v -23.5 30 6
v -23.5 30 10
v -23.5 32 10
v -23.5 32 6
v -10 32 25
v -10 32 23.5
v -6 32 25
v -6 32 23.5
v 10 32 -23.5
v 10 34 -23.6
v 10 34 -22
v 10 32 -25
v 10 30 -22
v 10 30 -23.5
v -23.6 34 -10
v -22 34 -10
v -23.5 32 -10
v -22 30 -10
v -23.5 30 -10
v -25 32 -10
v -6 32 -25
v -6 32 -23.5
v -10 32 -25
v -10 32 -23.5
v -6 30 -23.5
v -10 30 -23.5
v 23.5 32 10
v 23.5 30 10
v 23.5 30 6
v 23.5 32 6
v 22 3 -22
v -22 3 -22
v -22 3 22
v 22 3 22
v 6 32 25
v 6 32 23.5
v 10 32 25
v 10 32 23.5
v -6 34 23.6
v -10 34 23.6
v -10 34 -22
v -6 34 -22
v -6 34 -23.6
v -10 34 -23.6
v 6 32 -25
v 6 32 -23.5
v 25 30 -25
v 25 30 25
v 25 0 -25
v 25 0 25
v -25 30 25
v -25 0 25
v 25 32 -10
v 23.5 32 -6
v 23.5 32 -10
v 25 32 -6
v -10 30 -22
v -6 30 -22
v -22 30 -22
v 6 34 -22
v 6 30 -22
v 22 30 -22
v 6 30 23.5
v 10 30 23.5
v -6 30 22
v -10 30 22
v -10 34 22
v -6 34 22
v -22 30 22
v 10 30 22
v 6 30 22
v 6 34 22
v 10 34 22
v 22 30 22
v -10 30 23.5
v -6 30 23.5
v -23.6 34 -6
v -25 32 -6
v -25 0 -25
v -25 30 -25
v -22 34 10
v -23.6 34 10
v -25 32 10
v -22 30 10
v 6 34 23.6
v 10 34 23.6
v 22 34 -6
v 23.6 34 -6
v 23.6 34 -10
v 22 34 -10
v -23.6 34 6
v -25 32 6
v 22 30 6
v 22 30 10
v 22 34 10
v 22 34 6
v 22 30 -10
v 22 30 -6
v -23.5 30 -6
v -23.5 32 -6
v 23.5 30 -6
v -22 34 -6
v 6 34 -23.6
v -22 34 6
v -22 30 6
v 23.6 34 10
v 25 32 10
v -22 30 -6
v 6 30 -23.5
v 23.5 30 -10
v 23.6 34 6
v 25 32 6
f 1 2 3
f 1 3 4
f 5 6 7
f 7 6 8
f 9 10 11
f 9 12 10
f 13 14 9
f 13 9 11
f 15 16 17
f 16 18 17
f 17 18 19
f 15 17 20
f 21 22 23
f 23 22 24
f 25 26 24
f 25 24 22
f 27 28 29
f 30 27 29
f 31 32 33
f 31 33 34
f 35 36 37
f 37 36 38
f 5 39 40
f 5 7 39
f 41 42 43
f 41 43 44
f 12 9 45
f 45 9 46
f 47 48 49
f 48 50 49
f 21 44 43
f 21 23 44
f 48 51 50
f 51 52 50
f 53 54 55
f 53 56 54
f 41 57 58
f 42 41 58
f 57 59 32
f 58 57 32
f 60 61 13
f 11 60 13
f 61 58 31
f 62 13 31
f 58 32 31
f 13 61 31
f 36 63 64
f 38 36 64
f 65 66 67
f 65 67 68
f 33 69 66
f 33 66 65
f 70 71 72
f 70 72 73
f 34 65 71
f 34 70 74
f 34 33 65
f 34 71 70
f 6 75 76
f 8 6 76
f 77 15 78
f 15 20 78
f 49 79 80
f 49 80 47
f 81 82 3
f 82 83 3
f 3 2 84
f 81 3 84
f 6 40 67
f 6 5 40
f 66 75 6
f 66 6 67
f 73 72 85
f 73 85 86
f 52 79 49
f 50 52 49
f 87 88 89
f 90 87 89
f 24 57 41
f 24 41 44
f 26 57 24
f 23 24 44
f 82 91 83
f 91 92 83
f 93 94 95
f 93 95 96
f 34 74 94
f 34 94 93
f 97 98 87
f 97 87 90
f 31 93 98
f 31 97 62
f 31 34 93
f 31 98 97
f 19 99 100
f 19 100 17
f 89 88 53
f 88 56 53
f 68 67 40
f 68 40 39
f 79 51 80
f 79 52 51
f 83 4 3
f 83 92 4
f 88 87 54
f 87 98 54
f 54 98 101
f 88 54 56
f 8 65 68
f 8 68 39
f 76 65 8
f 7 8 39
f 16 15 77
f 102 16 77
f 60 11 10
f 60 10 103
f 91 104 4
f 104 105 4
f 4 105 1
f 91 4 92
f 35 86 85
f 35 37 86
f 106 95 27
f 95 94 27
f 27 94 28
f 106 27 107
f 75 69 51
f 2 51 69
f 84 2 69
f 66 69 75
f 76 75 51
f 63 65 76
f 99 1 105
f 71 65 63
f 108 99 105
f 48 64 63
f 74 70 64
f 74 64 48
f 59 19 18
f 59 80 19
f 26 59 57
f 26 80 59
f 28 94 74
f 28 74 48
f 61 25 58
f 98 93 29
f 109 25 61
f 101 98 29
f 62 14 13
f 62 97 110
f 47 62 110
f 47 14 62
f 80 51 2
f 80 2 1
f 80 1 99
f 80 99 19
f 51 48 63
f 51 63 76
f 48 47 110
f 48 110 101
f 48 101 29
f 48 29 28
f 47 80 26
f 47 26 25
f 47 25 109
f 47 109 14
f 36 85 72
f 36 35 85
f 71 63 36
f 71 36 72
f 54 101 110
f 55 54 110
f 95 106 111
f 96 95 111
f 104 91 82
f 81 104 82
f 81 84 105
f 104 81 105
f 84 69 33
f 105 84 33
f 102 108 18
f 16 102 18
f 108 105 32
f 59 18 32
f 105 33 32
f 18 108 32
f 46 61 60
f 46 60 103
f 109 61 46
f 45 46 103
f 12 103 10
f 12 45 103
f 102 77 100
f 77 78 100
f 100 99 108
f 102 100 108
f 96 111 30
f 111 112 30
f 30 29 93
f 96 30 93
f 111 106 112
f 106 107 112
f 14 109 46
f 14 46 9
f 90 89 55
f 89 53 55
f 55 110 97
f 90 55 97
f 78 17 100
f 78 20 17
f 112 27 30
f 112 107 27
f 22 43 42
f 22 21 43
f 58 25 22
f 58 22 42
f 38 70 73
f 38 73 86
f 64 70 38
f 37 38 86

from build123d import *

# Parameters (mm, degrees)
SKETCH_1_W      = 50
SKETCH_1_H      = 50
EXTRUDE_1_DEPTH = 3
SKETCH_2_W      = 50
SKETCH_2_H      = 50
SKETCH_2_W_2    = 44
SKETCH_2_H_2    = 44
EXTRUDE_2_DEPTH = 27
SKETCH_3_W      = 4
SKETCH_3_H      = 1.5
SKETCH_3_W_2    = 1.5
SKETCH_3_H_2    = 4
EXTRUDE_3_DEPTH = 4


with BuildPart() as part:
    # 草图1 → 凸台-拉伸1 (new body)
    with BuildSketch(Plane(origin=(0, 0, 0), x_dir=(1, 0, 0), z_dir=(0, 1, 0))):
        Rectangle(SKETCH_1_W, SKETCH_1_H)
    extrude(amount=EXTRUDE_1_DEPTH)

    # 草图2 → 凸台-拉伸2 (add)
    with BuildSketch(Plane(origin=(0, 3, 0), x_dir=(1, 0, 0), z_dir=(0, 1, 0))):
        Rectangle(SKETCH_2_W, SKETCH_2_H)
        Rectangle(SKETCH_2_W_2, SKETCH_2_H_2, mode=Mode.SUBTRACT)
    extrude(amount=EXTRUDE_2_DEPTH)

    # 草图3 → 凸台-拉伸3 (add)
    with BuildSketch(Plane(origin=(0, 30, 0), x_dir=(1, 0, 0), z_dir=(0, 1, 0))):
        with Locations((-8, -22.75)):
            Rectangle(SKETCH_3_W, SKETCH_3_H)
        with Locations((8, -22.75)):
            Rectangle(SKETCH_3_W, SKETCH_3_H)
        with Locations((-22.75, 8)):
            Rectangle(SKETCH_3_W_2, SKETCH_3_H_2)
        with Locations((-22.75, -8)):
            Rectangle(SKETCH_3_W_2, SKETCH_3_H_2)
        with Locations((8, 22.75)):
            Rectangle(SKETCH_3_W, SKETCH_3_H)
        with Locations((-8, 22.75)):
            Rectangle(SKETCH_3_W, SKETCH_3_H)
        with Locations((22.75, -8)):
            Rectangle(SKETCH_3_W_2, SKETCH_3_H_2)
        with Locations((22.75, 8)):
            Rectangle(SKETCH_3_W_2, SKETCH_3_H_2)
    extrude(amount=EXTRUDE_3_DEPTH)

    # 草图4 → 放样2 section 0
    with BuildSketch(Plane(origin=(0, 34, 0), x_dir=(1, 0, 0), z_dir=(0, 1, 0))):
        with BuildLine():
            Line((-23.5, 10), (-23.6, 10))
            Line((-23.6, 10), (-23.6, 6))
            Line((-23.6, 6), (-23.5, 6))
            Line((-23.5, 6), (-23.5, 10))
        make_face()
    # 草图6 → 放样2 section 1
    with BuildSketch(Plane(origin=(0, 32, 0), x_dir=(1, 0, 0), z_dir=(0, 1, 0))):
        with BuildLine():
            Line((-23.5, 10), (-25, 10))
            Line((-25, 10), (-25, 6))
            Line((-25, 6), (-23.5, 6))
            Line((-23.5, 6), (-23.5, 10))
        make_face()
    loft()

    # 草图8 → 放样3 section 0
    with BuildSketch(Plane(origin=(0, 34, 0), x_dir=(1, 0, 0), z_dir=(0, 1, 0))):
        with BuildLine():
            Line((-23.5, -6), (-23.6, -6))
            Line((-23.6, -6), (-23.6, -10))
            Line((-23.6, -10), (-23.5, -10))
            Line((-23.5, -10), (-23.5, -6))
        make_face()
    # 草图9 → 放样3 section 1
    with BuildSketch(Plane(origin=(0, 32, 0), x_dir=(1, 0, 0), z_dir=(0, 1, 0))):
        with BuildLine():
            Line((-23.5, -6), (-25, -6))
            Line((-25, -6), (-25, -10))
            Line((-25, -10), (-23.5, -10))
            Line((-23.5, -10), (-23.5, -6))
        make_face()
    loft()

    # 草图10 → 放样4 section 0
    with BuildSketch(Plane(origin=(0, 34, 0), x_dir=(1, 0, 0), z_dir=(0, 1, 0))):
        with BuildLine():
            Line((-10, -23.5), (-6, -23.5))
            Line((-6, -23.5), (-6, -23.6))
            Line((-6, -23.6), (-10, -23.6))
            Line((-10, -23.6), (-10, -23.5))
        make_face()
    # 草图11 → 放样4 section 1
    with BuildSketch(Plane(origin=(0, 32, 0), x_dir=(1, 0, 0), z_dir=(0, 1, 0))):
        with BuildLine():
            Line((-10, -23.5), (-6, -23.5))
            Line((-6, -23.5), (-6, -25))
            Line((-6, -25), (-10, -25))
            Line((-10, -25), (-10, -23.5))
        make_face()
    loft()

    # 草图12 → 放样5 section 0
    with BuildSketch(Plane(origin=(0, 34, 0), x_dir=(1, 0, 0), z_dir=(0, 1, 0))):
        with BuildLine():
            Line((6, -23.5), (10, -23.5))
            Line((10, -23.5), (10, -23.6))
            Line((10, -23.6), (6, -23.6))
            Line((6, -23.6), (6, -23.5))
        make_face()
    # 草图13 → 放样5 section 1
    with BuildSketch(Plane(origin=(0, 32, 0), x_dir=(1, 0, 0), z_dir=(0, 1, 0))):
        with BuildLine():
            Line((6, -23.5), (10, -23.5))
            Line((10, -23.5), (10, -25))
            Line((10, -25), (6, -25))
            Line((6, -25), (6, -23.5))
        make_face()
    loft()

    # 草图14 → 放样6 section 0
    with BuildSketch(Plane(origin=(0, 34, 0), x_dir=(1, 0, 0), z_dir=(0, 1, 0))):
        with BuildLine():
            Line((23.5, -10), (23.6, -10))
            Line((23.6, -10), (23.6, -6))
            Line((23.6, -6), (23.5, -6))
            Line((23.5, -6), (23.5, -10))
        make_face()
    # 草图15 → 放样6 section 1
    with BuildSketch(Plane(origin=(0, 32, 0), x_dir=(1, 0, 0), z_dir=(0, 1, 0))):
        with BuildLine():
            Line((23.5, -10), (25, -10))
            Line((25, -10), (25, -6))
            Line((25, -6), (23.5, -6))
            Line((23.5, -6), (23.5, -10))
        make_face()
    loft()

    # 草图16 → 放样7 section 0
    with BuildSketch(Plane(origin=(0, 34, 0), x_dir=(1, 0, 0), z_dir=(0, 1, 0))):
        with BuildLine():
            Line((23.5, 6), (23.6, 6))
            Line((23.6, 6), (23.6, 10))
            Line((23.6, 10), (23.5, 10))
            Line((23.5, 10), (23.5, 6))
        make_face()
    # 草图17 → 放样7 section 1
    with BuildSketch(Plane(origin=(0, 32, 0), x_dir=(1, 0, 0), z_dir=(0, 1, 0))):
        with BuildLine():
            Line((23.5, 6), (25, 6))
            Line((25, 6), (25, 10))
            Line((25, 10), (23.5, 10))
            Line((23.5, 10), (23.5, 6))
        make_face()
    loft()

    # 草图18 → 放样8 section 0
    with BuildSketch(Plane(origin=(0, 34, 0), x_dir=(1, 0, 0), z_dir=(0, 1, 0))):
        with BuildLine():
            Line((-6, 23.5), (-10, 23.5))
            Line((-10, 23.5), (-10, 23.6))
            Line((-10, 23.6), (-6, 23.6))
            Line((-6, 23.6), (-6, 23.5))
        make_face()
    # 草图19 → 放样8 section 1
    with BuildSketch(Plane(origin=(0, 32, 0), x_dir=(1, 0, 0), z_dir=(0, 1, 0))):
        with BuildLine():
            Line((-6, 23.5), (-10, 23.5))
            Line((-10, 23.5), (-10, 25))
            Line((-10, 25), (-6, 25))
            Line((-6, 25), (-6, 23.5))
        make_face()
    loft()

    # 草图20 → 放样9 section 0
    with BuildSketch(Plane(origin=(0, 34, 0), x_dir=(1, 0, 0), z_dir=(0, 1, 0))):
        with BuildLine():
            Line((10, 23.5), (6, 23.5))
            Line((6, 23.5), (6, 23.6))
            Line((6, 23.6), (10, 23.6))
            Line((10, 23.6), (10, 23.5))
        make_face()
    # 草图21 → 放样9 section 1
    with BuildSketch(Plane(origin=(0, 32, 0), x_dir=(1, 0, 0), z_dir=(0, 1, 0))):
        with BuildLine():
            Line((10, 23.5), (6, 23.5))
            Line((6, 23.5), (6, 25))
            Line((6, 25), (10, 25))
            Line((10, 25), (10, 23.5))
        make_face()
    loft()


solid = part.part
